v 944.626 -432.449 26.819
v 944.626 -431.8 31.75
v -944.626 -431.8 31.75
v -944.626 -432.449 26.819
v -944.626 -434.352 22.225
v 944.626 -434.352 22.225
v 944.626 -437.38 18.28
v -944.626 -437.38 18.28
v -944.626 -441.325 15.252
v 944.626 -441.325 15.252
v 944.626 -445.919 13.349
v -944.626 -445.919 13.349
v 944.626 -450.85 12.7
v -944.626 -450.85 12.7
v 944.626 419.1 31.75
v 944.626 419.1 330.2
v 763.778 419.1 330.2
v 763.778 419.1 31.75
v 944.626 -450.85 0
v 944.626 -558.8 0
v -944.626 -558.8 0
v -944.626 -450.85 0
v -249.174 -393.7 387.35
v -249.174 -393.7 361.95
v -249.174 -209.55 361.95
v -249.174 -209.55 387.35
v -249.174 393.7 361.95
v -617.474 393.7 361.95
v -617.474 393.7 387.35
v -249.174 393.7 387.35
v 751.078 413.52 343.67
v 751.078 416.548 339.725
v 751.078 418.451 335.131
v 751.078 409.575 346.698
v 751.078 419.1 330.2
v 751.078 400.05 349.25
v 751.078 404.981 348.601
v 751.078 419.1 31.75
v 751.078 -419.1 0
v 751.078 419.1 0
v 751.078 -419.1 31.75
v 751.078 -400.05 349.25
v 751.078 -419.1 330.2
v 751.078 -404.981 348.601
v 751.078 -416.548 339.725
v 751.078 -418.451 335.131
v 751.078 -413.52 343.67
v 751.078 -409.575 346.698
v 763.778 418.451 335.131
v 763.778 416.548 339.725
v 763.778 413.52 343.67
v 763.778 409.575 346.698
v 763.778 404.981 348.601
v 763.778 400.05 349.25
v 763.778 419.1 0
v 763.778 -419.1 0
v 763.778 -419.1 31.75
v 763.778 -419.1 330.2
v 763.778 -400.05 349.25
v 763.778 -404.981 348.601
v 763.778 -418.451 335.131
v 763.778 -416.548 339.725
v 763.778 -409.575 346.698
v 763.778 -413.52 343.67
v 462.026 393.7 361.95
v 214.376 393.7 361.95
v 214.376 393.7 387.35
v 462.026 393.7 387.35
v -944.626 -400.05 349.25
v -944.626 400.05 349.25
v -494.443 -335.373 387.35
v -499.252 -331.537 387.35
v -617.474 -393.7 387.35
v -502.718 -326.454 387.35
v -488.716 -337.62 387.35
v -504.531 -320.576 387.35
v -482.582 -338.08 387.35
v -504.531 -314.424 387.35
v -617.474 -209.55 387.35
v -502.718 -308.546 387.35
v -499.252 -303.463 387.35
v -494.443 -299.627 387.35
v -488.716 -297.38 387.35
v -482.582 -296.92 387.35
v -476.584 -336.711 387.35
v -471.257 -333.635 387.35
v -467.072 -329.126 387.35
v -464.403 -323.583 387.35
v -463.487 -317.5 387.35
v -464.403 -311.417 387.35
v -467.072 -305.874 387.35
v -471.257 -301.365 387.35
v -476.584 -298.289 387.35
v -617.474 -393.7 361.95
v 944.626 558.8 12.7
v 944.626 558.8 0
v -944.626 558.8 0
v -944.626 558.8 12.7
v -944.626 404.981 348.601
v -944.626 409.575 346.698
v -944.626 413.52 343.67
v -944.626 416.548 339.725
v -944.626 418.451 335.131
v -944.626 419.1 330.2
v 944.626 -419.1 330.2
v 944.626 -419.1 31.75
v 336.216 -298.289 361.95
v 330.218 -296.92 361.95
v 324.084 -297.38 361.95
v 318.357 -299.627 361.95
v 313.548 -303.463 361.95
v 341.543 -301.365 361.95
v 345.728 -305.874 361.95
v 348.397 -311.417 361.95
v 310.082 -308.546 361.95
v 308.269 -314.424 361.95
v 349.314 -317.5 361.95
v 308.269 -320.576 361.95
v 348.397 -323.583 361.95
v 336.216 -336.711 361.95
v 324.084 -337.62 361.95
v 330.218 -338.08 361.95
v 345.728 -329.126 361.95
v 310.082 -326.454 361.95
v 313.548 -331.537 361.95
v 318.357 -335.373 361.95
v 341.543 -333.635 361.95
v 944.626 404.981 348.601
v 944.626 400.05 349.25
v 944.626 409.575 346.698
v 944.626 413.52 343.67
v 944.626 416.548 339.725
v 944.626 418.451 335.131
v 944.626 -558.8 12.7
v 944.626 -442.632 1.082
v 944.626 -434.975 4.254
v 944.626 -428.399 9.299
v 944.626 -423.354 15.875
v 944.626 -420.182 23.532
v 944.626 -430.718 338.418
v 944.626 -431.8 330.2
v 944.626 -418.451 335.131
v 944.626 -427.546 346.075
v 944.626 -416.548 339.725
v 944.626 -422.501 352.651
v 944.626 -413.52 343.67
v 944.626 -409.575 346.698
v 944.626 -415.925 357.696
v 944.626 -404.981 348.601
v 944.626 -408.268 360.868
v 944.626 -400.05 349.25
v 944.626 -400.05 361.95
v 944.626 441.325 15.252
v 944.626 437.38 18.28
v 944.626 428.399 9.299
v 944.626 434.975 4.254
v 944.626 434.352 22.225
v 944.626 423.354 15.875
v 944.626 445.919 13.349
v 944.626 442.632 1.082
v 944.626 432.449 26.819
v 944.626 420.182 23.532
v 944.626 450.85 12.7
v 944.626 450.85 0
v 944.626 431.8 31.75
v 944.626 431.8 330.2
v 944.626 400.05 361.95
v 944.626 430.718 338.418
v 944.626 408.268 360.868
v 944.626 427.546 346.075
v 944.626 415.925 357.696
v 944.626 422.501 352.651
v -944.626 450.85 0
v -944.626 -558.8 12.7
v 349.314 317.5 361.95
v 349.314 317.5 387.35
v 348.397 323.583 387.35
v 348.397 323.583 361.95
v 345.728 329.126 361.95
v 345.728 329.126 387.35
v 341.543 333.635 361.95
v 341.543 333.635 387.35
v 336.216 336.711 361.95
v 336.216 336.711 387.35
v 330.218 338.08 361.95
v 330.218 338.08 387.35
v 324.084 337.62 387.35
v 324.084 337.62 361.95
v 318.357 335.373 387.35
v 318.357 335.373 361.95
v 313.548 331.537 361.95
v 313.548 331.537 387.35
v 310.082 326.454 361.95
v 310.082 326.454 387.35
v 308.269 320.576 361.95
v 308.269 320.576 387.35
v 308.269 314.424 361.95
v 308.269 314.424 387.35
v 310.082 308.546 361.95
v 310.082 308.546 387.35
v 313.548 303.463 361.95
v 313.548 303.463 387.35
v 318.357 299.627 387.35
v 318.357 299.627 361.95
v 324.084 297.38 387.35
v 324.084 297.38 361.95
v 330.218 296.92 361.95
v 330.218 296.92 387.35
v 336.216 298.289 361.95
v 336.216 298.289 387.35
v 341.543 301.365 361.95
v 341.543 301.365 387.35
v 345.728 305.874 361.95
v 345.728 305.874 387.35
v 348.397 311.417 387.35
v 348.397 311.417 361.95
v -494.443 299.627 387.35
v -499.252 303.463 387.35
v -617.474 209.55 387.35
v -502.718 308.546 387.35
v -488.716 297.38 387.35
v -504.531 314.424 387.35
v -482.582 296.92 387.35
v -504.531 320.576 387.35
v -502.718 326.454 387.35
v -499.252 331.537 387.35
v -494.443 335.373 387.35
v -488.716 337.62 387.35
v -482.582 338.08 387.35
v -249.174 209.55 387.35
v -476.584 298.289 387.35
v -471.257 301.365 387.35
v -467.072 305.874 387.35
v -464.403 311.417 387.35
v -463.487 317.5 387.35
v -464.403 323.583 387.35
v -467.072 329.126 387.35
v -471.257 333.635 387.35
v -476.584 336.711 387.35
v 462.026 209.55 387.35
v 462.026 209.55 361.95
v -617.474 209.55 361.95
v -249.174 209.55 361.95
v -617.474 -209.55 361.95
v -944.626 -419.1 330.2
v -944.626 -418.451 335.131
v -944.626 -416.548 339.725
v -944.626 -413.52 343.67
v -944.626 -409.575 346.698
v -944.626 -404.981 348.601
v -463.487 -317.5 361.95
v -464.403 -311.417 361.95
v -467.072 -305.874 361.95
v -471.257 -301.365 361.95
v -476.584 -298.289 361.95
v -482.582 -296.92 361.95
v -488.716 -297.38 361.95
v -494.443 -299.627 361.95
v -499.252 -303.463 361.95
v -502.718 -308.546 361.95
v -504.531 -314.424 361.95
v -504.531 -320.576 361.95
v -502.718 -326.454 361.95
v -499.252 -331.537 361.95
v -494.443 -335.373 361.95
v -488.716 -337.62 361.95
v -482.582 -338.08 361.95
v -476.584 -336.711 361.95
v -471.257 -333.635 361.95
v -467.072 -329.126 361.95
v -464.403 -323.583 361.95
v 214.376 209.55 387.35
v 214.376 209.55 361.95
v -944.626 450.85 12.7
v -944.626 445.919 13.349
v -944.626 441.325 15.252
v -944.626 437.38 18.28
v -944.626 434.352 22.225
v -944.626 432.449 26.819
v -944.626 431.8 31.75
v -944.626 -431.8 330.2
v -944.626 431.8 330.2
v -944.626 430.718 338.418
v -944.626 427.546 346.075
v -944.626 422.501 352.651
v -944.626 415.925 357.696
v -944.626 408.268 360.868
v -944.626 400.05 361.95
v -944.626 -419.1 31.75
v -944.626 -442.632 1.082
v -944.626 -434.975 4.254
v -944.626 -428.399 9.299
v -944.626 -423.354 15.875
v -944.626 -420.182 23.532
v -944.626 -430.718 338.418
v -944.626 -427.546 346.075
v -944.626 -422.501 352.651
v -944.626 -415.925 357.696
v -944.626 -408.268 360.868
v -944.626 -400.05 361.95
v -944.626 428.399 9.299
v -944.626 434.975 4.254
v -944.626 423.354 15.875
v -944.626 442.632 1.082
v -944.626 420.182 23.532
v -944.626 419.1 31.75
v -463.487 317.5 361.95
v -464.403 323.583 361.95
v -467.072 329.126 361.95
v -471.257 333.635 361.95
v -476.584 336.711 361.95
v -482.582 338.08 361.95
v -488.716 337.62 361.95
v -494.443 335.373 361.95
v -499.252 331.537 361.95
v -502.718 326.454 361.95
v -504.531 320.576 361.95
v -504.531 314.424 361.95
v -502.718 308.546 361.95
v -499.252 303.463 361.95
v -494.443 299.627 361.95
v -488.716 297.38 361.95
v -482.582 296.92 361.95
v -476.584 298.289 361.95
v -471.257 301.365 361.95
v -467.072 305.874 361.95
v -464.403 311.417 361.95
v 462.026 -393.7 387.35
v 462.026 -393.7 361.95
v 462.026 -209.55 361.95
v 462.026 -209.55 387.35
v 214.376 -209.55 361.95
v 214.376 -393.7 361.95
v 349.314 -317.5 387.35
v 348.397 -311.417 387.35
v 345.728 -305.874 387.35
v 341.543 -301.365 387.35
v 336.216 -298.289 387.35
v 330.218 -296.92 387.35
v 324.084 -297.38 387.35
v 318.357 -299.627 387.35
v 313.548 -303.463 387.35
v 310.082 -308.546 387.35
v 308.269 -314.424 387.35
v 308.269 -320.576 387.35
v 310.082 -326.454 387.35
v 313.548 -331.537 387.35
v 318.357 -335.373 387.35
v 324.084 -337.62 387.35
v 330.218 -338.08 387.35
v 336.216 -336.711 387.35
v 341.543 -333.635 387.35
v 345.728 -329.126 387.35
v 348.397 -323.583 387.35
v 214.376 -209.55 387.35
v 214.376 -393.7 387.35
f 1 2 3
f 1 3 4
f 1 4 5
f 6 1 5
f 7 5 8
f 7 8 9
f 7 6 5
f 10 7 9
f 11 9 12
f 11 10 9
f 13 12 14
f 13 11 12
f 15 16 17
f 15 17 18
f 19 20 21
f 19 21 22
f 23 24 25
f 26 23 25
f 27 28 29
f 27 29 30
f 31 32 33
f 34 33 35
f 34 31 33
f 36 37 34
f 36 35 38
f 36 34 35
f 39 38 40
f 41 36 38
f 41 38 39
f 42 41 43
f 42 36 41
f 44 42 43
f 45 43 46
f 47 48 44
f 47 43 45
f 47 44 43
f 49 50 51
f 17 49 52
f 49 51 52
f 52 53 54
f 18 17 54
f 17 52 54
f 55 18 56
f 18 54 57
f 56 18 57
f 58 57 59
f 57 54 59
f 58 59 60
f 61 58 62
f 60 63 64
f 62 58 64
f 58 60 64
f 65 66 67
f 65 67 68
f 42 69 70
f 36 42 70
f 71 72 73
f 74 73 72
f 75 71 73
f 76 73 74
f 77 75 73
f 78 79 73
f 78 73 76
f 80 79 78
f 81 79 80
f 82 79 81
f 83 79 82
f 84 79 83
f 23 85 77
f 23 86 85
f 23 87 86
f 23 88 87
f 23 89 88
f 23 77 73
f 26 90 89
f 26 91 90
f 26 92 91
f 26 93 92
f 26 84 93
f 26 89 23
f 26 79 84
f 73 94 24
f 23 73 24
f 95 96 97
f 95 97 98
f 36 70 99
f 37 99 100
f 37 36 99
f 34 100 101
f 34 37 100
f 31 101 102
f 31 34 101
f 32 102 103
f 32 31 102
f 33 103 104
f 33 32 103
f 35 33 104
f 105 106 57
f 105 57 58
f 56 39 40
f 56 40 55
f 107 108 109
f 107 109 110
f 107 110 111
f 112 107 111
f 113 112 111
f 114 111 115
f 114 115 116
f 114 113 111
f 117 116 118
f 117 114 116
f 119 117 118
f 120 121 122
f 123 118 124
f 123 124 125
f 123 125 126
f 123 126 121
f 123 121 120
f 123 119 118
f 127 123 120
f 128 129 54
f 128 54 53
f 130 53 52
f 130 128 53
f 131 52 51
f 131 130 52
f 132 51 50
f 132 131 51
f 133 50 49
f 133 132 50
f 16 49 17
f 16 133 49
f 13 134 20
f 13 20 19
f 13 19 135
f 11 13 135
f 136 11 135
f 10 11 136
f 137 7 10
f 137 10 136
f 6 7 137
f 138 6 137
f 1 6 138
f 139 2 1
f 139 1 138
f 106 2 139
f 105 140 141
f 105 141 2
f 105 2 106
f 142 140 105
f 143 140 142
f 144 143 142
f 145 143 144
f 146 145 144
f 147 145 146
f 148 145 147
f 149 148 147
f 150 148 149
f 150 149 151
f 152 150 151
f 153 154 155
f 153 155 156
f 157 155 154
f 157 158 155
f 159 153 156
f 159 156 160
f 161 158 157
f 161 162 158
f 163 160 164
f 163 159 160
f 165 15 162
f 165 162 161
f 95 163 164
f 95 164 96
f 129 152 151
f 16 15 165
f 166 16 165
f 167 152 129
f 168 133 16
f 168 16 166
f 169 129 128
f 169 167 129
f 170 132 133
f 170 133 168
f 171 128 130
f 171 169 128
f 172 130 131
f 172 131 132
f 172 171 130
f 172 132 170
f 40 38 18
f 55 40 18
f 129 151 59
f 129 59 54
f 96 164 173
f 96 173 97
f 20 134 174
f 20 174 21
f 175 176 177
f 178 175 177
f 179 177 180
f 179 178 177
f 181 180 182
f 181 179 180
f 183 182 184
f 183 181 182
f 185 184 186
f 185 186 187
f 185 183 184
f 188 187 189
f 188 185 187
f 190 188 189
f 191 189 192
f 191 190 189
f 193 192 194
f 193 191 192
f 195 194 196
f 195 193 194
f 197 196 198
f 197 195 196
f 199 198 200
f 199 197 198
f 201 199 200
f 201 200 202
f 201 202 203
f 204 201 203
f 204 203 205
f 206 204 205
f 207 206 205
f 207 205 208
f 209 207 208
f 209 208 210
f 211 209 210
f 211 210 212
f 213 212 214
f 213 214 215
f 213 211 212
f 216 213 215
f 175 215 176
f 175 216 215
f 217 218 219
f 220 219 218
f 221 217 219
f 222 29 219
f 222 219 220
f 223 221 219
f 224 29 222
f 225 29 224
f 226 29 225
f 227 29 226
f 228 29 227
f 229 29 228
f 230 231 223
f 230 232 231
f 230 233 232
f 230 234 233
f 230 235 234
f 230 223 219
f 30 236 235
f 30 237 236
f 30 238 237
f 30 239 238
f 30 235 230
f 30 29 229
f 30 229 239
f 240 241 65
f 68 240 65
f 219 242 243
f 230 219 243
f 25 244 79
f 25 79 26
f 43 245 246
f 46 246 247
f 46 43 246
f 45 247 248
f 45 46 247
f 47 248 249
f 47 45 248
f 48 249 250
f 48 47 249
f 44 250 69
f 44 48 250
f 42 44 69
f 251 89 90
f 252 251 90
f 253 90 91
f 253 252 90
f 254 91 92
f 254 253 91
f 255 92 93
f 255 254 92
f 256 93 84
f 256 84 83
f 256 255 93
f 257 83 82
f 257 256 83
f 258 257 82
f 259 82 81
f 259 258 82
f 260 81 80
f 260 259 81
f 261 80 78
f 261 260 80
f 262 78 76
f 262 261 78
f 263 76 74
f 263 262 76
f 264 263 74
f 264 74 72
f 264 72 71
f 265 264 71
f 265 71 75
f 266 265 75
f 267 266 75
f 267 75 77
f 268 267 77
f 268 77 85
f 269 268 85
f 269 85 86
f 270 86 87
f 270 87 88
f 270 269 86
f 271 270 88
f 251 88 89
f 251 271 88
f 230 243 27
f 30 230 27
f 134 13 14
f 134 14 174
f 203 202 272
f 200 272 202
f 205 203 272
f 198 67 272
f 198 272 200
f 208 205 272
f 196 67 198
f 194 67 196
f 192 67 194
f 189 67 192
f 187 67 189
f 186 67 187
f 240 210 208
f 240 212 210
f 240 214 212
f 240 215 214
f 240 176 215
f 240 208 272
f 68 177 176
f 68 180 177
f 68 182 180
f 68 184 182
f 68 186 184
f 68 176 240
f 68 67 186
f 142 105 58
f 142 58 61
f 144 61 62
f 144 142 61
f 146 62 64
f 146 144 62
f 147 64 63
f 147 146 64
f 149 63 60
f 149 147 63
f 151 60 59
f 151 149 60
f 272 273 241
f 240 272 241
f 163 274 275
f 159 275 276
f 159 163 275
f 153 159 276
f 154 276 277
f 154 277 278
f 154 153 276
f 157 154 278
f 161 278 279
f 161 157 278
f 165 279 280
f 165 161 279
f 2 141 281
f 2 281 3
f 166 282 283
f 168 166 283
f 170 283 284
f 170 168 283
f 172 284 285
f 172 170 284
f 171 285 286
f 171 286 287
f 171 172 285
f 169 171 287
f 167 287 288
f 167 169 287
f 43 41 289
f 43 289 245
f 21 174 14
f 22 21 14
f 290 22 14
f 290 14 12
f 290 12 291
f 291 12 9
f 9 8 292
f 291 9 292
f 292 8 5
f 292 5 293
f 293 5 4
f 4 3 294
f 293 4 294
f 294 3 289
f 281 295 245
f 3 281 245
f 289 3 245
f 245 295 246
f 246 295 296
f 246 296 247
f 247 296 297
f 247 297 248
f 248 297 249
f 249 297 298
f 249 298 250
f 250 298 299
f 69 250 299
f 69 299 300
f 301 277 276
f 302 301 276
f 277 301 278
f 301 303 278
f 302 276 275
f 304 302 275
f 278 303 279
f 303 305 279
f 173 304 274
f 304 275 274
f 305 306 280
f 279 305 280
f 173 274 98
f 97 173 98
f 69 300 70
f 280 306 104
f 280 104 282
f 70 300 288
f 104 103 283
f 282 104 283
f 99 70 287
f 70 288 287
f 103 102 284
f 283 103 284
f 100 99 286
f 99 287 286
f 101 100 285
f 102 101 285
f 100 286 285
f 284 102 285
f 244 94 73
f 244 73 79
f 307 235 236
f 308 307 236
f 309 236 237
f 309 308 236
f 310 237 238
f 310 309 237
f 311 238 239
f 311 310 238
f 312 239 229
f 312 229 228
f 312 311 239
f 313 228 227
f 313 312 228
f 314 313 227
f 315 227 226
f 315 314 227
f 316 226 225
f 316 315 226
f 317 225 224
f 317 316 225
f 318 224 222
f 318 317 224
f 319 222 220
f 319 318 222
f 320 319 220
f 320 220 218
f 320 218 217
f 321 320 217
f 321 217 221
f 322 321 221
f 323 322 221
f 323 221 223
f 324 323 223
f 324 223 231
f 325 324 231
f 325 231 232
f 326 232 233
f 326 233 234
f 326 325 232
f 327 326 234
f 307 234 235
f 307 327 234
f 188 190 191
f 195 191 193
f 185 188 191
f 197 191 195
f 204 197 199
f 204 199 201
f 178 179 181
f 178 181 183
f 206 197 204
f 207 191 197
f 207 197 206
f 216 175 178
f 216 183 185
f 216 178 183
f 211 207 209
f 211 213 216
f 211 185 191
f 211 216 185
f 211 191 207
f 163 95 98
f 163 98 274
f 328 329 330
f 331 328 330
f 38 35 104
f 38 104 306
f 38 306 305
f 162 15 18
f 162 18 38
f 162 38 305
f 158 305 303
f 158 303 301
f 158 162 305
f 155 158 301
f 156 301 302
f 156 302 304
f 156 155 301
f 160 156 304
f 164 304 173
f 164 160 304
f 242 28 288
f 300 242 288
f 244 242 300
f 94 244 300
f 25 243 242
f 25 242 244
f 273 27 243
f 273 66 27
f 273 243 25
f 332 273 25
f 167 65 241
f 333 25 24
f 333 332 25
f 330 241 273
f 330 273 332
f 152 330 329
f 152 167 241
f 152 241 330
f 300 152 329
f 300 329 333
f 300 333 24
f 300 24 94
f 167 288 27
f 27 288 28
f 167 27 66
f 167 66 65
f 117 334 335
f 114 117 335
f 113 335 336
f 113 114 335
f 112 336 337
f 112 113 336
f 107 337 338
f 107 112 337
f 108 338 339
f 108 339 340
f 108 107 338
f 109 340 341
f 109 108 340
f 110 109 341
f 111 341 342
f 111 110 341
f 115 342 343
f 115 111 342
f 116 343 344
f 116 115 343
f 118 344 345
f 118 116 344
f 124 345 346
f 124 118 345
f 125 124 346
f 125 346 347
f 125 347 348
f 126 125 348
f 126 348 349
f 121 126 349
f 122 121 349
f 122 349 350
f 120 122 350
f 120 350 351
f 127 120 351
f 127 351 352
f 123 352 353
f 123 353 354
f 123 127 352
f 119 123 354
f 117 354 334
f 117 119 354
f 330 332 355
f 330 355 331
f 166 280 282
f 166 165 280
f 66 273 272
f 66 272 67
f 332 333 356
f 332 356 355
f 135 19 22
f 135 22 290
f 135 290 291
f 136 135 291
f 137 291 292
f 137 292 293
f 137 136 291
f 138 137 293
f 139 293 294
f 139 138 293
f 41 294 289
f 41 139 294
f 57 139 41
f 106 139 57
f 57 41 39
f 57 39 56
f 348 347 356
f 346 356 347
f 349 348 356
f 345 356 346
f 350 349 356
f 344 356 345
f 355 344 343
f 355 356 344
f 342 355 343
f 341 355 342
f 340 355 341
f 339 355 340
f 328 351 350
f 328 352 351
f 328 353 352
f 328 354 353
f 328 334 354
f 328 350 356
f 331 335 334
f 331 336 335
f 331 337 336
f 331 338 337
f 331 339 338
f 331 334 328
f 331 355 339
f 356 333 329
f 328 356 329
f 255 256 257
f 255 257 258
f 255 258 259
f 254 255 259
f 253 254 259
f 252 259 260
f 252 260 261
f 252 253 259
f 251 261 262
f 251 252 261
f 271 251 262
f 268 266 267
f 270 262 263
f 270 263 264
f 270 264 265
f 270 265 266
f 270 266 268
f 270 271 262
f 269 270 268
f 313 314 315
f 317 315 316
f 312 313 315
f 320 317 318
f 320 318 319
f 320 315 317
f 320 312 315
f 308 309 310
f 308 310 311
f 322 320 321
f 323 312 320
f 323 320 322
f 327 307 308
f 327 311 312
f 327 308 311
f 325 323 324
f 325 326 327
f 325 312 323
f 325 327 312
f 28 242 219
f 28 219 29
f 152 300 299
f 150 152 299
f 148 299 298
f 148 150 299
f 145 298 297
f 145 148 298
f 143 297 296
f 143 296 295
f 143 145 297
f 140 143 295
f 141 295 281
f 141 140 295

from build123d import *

# Parameters (mm, degrees)
F1_DEPTH = 944.626
F2_W     = 12.7
F2_H     = 838.2
F3_DEPTH = 349.25
F4_W     = 368.3
F4_H     = 184.15
F4_R     = 20.6375
F4_W_2   = 247.65
F5_DEPTH = 25.4


with BuildPart() as f1:
    # F0 (on Right) → F1 (new body, symmetric)
    with BuildSketch(Plane.YZ):
        with BuildLine():
            Line((400.05, 361.95), (0, 361.95))
            Line((0, 361.95), (-400.05, 361.95))
            ThreePointArc((-400.05, 361.95), (-422.50064, 352.65064), (-431.8, 330.2))
            Line((-431.8, 330.2), (-431.8, 31.75))
            ThreePointArc((-431.8, 31.75), (-437.379616, 18.279616), (-450.85, 12.7))
            Line((-450.85, 12.7), (-558.8, 12.7))
            Line((-558.8, 12.7), (-558.8, 6.35))
            Line((-558.8, 6.35), (-558.8, 0))
            Line((-558.8, 0), (-450.85, 0))
            ThreePointArc((-450.85, 0), (-428.39936, 9.29936), (-419.1, 31.75))
            Line((-419.1, 31.75), (-419.1, 330.2))
            ThreePointArc((-419.1, 330.2), (-413.520384, 343.670384), (-400.05, 349.25))
            Line((-400.05, 349.25), (0, 349.25))
            Line((0, 349.25), (400.05, 349.25))
            ThreePointArc((400.05, 349.25), (413.520384, 343.670384), (419.1, 330.2))
            Line((419.1, 330.2), (419.1, 31.75))
            ThreePointArc((419.1, 31.75), (428.39936, 9.29936), (450.85, 0))
            Line((450.85, 0), (558.8, 0))
            Line((558.8, 0), (558.8, 6.35))
            Line((558.8, 6.35), (558.8, 12.7))
            Line((558.8, 12.7), (450.85, 12.7))
            ThreePointArc((450.85, 12.7), (437.379616, 18.279616), (431.8, 31.75))
            Line((431.8, 31.75), (431.8, 330.2))
            ThreePointArc((431.8, 330.2), (422.50064, 352.65064), (400.05, 361.95))
        make_face()
    extrude(amount=F1_DEPTH, both=True)

    # F2 (on face) → F3 (join, through all)
    with BuildSketch(Plane(origin=(0, 0, 349.25), x_dir=(1, 0, 0), z_dir=(0, 0, -1))):
        with Locations((757.428, 0)):
            Rectangle(F2_W, F2_H)
    extrude(amount=F3_DEPTH)

    # F4 (on face) → F5 (join)
    with BuildSketch(Plane.XY.offset(361.95)):
        with Locations((-433.324, 301.625)):
            Rectangle(F4_W, F4_H)
        with Locations((-484.124, 317.5)):
            Circle(F4_R, mode=Mode.SUBTRACT)
        with Locations((338.201, 301.625)):
            Rectangle(F4_W_2, F4_H)
        with Locations((328.676, 317.5)):
            Circle(F4_R, mode=Mode.SUBTRACT)
        with Locations((338.201, -301.625)):
            Rectangle(F4_W_2, F4_H)
        with Locations((328.676, -317.5)):
            Circle(F4_R, mode=Mode.SUBTRACT)
        with Locations((-433.324, -301.625)):
            Rectangle(F4_W, F4_H)
        with Locations((-484.124, -317.5)):
            Circle(F4_R, mode=Mode.SUBTRACT)
    extrude(amount=F5_DEPTH)


solid = f1.part
